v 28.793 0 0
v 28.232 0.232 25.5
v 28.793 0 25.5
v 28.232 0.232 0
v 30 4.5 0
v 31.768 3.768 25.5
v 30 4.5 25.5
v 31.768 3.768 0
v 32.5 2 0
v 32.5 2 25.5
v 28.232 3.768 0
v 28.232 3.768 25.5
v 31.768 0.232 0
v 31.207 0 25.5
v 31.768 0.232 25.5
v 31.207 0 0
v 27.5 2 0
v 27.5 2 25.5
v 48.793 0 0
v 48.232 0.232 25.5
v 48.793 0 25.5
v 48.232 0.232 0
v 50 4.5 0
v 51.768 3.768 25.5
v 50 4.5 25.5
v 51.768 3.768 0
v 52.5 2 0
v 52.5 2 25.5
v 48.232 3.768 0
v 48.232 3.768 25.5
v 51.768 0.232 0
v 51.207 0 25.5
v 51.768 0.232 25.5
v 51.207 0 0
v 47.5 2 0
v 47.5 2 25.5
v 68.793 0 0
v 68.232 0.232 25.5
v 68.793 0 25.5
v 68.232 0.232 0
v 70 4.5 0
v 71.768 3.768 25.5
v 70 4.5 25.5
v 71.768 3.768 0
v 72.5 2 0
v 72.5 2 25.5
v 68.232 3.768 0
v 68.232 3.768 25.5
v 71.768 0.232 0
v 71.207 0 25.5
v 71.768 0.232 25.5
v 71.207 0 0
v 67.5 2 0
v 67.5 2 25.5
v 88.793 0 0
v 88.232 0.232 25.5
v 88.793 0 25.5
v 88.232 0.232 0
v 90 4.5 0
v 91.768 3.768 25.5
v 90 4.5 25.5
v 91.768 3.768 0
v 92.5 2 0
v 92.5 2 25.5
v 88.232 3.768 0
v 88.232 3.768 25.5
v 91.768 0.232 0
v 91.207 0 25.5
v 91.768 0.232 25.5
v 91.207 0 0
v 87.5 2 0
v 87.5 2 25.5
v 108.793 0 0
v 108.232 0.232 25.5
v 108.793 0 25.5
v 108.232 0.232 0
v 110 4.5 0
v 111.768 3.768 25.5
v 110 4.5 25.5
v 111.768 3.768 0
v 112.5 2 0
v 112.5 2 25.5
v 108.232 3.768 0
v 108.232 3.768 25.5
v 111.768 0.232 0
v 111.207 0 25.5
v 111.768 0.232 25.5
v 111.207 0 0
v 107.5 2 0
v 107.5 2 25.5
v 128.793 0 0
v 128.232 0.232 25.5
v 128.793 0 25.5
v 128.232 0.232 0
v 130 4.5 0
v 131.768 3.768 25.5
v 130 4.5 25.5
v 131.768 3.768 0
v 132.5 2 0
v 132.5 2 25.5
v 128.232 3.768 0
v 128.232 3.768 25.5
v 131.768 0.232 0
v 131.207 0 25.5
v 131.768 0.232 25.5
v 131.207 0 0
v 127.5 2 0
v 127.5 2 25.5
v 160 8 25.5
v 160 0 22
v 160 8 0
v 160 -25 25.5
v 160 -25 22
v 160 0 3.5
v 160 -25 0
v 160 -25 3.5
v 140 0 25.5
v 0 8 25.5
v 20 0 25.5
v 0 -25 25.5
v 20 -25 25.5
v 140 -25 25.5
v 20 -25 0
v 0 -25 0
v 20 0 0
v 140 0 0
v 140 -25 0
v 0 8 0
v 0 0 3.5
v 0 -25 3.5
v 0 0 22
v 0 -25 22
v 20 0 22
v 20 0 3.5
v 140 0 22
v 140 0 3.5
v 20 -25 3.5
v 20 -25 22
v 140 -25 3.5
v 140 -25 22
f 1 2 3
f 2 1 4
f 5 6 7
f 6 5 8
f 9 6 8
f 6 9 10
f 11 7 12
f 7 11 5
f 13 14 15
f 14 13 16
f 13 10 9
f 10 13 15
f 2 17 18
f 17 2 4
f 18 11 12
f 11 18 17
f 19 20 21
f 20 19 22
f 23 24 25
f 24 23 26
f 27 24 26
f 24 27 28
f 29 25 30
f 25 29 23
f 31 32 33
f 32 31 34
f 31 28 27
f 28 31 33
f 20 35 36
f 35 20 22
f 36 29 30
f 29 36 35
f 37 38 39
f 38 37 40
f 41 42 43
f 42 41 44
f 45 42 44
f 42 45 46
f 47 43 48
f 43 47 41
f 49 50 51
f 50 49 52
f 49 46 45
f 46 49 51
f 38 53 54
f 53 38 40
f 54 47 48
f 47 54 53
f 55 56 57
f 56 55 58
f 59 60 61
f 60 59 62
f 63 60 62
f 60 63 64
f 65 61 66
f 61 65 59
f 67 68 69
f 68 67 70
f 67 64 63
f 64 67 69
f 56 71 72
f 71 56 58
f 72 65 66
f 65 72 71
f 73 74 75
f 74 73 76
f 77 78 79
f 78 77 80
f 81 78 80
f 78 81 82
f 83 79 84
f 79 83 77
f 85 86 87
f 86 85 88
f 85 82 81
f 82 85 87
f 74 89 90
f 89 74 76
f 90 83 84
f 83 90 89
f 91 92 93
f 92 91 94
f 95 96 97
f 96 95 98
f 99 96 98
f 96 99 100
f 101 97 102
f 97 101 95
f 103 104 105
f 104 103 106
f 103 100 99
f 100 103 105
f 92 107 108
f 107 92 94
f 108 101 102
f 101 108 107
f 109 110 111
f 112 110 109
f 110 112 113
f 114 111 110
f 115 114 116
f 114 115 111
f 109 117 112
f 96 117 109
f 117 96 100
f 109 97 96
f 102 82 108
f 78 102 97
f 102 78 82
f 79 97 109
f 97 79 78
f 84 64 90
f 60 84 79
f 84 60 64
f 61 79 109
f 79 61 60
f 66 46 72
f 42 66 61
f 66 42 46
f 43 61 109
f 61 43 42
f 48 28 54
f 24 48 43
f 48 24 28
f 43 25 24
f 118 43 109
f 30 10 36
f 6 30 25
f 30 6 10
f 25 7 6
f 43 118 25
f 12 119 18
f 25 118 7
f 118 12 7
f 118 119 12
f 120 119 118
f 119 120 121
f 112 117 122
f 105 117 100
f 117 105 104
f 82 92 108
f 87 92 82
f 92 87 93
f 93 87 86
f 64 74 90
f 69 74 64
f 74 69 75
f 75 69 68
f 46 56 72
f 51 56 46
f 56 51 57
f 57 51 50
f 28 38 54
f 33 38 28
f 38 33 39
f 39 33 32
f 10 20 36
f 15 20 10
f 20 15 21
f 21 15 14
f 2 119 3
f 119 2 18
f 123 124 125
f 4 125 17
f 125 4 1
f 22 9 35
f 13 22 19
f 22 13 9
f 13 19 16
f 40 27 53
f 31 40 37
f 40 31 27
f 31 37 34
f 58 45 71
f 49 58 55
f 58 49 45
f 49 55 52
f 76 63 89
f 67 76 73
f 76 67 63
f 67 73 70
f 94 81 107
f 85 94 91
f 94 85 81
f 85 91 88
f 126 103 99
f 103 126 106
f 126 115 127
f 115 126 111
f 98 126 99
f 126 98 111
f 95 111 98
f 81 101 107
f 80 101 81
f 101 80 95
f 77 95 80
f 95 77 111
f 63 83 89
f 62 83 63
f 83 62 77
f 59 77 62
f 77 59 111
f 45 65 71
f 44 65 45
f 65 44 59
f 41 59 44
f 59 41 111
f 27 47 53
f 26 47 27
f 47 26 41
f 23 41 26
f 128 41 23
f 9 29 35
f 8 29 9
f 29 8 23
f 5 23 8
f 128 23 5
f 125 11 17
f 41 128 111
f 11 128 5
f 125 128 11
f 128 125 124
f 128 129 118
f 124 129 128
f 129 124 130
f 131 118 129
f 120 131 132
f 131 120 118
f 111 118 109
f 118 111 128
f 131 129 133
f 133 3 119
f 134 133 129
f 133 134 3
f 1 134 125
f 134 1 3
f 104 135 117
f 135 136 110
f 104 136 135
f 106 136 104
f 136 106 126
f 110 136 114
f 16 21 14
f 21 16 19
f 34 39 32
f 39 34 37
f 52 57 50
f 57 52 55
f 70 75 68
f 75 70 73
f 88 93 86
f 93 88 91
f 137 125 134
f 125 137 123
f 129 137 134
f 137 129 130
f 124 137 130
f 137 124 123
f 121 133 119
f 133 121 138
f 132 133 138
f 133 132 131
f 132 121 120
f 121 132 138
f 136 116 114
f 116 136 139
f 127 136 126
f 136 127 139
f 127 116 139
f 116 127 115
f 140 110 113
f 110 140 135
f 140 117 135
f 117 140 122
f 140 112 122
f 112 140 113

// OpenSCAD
// [FL_INDEX: keywords="openscad, 3d_parametric, Customizable_Simple_USB_Cable_Catcher___Desk_Tidy, csg_solid" | COT="Parametric OpenSCAD design from 3DCodeverse"]
// Title: Customizable Simple USB Cable Catcher / Desk Tidy

// How thick your desk is.
deskh = 18.5; // 
//How wide you want the cable catcher to be
fullWidth = 160;
//How deep (ensure it fits between your desk and the wall!)
depth = 8;
//The gap between usb cable slots
slotGap=20;
//The diameter of the slot to hold the usb cable 
slotDiameter = 5;
//How far to recess the slot.
slotRecess=2;
//Thickness of the tabs which hold the USB catcher to the desk
tabHeight = 3.5;  
// Tab width
tabWidth = 20;
//Tab length
tabLength = 25;
module cableCatcher() {
difference()
{
	cube([fullWidth, depth, deskh+2*tabHeight]);
		for (z = [tabWidth+(slotGap/2) : slotGap : fullWidth-(tabWidth+(slotGap/2))] ) 
		{
   			  translate([z, slotRecess,-5]) cylinder(r=slotDiameter/2.0, h=40);
    		}
}
 translate([0,-tabLength,0]) 	cube([tabWidth, tabLength,tabHeight]);
 translate([0,-tabLength,deskh+tabHeight]) cube([tabWidth, tabLength, tabHeight]);
 translate([fullWidth-tabWidth,-tabLength,0]) 	cube([tabWidth, tabLength, tabHeight]);
 translate([fullWidth-tabWidth,-tabLength,deskh+tabHeight]) cube([tabWidth, tabLength, tabHeight]);
}
cableCatcher();
